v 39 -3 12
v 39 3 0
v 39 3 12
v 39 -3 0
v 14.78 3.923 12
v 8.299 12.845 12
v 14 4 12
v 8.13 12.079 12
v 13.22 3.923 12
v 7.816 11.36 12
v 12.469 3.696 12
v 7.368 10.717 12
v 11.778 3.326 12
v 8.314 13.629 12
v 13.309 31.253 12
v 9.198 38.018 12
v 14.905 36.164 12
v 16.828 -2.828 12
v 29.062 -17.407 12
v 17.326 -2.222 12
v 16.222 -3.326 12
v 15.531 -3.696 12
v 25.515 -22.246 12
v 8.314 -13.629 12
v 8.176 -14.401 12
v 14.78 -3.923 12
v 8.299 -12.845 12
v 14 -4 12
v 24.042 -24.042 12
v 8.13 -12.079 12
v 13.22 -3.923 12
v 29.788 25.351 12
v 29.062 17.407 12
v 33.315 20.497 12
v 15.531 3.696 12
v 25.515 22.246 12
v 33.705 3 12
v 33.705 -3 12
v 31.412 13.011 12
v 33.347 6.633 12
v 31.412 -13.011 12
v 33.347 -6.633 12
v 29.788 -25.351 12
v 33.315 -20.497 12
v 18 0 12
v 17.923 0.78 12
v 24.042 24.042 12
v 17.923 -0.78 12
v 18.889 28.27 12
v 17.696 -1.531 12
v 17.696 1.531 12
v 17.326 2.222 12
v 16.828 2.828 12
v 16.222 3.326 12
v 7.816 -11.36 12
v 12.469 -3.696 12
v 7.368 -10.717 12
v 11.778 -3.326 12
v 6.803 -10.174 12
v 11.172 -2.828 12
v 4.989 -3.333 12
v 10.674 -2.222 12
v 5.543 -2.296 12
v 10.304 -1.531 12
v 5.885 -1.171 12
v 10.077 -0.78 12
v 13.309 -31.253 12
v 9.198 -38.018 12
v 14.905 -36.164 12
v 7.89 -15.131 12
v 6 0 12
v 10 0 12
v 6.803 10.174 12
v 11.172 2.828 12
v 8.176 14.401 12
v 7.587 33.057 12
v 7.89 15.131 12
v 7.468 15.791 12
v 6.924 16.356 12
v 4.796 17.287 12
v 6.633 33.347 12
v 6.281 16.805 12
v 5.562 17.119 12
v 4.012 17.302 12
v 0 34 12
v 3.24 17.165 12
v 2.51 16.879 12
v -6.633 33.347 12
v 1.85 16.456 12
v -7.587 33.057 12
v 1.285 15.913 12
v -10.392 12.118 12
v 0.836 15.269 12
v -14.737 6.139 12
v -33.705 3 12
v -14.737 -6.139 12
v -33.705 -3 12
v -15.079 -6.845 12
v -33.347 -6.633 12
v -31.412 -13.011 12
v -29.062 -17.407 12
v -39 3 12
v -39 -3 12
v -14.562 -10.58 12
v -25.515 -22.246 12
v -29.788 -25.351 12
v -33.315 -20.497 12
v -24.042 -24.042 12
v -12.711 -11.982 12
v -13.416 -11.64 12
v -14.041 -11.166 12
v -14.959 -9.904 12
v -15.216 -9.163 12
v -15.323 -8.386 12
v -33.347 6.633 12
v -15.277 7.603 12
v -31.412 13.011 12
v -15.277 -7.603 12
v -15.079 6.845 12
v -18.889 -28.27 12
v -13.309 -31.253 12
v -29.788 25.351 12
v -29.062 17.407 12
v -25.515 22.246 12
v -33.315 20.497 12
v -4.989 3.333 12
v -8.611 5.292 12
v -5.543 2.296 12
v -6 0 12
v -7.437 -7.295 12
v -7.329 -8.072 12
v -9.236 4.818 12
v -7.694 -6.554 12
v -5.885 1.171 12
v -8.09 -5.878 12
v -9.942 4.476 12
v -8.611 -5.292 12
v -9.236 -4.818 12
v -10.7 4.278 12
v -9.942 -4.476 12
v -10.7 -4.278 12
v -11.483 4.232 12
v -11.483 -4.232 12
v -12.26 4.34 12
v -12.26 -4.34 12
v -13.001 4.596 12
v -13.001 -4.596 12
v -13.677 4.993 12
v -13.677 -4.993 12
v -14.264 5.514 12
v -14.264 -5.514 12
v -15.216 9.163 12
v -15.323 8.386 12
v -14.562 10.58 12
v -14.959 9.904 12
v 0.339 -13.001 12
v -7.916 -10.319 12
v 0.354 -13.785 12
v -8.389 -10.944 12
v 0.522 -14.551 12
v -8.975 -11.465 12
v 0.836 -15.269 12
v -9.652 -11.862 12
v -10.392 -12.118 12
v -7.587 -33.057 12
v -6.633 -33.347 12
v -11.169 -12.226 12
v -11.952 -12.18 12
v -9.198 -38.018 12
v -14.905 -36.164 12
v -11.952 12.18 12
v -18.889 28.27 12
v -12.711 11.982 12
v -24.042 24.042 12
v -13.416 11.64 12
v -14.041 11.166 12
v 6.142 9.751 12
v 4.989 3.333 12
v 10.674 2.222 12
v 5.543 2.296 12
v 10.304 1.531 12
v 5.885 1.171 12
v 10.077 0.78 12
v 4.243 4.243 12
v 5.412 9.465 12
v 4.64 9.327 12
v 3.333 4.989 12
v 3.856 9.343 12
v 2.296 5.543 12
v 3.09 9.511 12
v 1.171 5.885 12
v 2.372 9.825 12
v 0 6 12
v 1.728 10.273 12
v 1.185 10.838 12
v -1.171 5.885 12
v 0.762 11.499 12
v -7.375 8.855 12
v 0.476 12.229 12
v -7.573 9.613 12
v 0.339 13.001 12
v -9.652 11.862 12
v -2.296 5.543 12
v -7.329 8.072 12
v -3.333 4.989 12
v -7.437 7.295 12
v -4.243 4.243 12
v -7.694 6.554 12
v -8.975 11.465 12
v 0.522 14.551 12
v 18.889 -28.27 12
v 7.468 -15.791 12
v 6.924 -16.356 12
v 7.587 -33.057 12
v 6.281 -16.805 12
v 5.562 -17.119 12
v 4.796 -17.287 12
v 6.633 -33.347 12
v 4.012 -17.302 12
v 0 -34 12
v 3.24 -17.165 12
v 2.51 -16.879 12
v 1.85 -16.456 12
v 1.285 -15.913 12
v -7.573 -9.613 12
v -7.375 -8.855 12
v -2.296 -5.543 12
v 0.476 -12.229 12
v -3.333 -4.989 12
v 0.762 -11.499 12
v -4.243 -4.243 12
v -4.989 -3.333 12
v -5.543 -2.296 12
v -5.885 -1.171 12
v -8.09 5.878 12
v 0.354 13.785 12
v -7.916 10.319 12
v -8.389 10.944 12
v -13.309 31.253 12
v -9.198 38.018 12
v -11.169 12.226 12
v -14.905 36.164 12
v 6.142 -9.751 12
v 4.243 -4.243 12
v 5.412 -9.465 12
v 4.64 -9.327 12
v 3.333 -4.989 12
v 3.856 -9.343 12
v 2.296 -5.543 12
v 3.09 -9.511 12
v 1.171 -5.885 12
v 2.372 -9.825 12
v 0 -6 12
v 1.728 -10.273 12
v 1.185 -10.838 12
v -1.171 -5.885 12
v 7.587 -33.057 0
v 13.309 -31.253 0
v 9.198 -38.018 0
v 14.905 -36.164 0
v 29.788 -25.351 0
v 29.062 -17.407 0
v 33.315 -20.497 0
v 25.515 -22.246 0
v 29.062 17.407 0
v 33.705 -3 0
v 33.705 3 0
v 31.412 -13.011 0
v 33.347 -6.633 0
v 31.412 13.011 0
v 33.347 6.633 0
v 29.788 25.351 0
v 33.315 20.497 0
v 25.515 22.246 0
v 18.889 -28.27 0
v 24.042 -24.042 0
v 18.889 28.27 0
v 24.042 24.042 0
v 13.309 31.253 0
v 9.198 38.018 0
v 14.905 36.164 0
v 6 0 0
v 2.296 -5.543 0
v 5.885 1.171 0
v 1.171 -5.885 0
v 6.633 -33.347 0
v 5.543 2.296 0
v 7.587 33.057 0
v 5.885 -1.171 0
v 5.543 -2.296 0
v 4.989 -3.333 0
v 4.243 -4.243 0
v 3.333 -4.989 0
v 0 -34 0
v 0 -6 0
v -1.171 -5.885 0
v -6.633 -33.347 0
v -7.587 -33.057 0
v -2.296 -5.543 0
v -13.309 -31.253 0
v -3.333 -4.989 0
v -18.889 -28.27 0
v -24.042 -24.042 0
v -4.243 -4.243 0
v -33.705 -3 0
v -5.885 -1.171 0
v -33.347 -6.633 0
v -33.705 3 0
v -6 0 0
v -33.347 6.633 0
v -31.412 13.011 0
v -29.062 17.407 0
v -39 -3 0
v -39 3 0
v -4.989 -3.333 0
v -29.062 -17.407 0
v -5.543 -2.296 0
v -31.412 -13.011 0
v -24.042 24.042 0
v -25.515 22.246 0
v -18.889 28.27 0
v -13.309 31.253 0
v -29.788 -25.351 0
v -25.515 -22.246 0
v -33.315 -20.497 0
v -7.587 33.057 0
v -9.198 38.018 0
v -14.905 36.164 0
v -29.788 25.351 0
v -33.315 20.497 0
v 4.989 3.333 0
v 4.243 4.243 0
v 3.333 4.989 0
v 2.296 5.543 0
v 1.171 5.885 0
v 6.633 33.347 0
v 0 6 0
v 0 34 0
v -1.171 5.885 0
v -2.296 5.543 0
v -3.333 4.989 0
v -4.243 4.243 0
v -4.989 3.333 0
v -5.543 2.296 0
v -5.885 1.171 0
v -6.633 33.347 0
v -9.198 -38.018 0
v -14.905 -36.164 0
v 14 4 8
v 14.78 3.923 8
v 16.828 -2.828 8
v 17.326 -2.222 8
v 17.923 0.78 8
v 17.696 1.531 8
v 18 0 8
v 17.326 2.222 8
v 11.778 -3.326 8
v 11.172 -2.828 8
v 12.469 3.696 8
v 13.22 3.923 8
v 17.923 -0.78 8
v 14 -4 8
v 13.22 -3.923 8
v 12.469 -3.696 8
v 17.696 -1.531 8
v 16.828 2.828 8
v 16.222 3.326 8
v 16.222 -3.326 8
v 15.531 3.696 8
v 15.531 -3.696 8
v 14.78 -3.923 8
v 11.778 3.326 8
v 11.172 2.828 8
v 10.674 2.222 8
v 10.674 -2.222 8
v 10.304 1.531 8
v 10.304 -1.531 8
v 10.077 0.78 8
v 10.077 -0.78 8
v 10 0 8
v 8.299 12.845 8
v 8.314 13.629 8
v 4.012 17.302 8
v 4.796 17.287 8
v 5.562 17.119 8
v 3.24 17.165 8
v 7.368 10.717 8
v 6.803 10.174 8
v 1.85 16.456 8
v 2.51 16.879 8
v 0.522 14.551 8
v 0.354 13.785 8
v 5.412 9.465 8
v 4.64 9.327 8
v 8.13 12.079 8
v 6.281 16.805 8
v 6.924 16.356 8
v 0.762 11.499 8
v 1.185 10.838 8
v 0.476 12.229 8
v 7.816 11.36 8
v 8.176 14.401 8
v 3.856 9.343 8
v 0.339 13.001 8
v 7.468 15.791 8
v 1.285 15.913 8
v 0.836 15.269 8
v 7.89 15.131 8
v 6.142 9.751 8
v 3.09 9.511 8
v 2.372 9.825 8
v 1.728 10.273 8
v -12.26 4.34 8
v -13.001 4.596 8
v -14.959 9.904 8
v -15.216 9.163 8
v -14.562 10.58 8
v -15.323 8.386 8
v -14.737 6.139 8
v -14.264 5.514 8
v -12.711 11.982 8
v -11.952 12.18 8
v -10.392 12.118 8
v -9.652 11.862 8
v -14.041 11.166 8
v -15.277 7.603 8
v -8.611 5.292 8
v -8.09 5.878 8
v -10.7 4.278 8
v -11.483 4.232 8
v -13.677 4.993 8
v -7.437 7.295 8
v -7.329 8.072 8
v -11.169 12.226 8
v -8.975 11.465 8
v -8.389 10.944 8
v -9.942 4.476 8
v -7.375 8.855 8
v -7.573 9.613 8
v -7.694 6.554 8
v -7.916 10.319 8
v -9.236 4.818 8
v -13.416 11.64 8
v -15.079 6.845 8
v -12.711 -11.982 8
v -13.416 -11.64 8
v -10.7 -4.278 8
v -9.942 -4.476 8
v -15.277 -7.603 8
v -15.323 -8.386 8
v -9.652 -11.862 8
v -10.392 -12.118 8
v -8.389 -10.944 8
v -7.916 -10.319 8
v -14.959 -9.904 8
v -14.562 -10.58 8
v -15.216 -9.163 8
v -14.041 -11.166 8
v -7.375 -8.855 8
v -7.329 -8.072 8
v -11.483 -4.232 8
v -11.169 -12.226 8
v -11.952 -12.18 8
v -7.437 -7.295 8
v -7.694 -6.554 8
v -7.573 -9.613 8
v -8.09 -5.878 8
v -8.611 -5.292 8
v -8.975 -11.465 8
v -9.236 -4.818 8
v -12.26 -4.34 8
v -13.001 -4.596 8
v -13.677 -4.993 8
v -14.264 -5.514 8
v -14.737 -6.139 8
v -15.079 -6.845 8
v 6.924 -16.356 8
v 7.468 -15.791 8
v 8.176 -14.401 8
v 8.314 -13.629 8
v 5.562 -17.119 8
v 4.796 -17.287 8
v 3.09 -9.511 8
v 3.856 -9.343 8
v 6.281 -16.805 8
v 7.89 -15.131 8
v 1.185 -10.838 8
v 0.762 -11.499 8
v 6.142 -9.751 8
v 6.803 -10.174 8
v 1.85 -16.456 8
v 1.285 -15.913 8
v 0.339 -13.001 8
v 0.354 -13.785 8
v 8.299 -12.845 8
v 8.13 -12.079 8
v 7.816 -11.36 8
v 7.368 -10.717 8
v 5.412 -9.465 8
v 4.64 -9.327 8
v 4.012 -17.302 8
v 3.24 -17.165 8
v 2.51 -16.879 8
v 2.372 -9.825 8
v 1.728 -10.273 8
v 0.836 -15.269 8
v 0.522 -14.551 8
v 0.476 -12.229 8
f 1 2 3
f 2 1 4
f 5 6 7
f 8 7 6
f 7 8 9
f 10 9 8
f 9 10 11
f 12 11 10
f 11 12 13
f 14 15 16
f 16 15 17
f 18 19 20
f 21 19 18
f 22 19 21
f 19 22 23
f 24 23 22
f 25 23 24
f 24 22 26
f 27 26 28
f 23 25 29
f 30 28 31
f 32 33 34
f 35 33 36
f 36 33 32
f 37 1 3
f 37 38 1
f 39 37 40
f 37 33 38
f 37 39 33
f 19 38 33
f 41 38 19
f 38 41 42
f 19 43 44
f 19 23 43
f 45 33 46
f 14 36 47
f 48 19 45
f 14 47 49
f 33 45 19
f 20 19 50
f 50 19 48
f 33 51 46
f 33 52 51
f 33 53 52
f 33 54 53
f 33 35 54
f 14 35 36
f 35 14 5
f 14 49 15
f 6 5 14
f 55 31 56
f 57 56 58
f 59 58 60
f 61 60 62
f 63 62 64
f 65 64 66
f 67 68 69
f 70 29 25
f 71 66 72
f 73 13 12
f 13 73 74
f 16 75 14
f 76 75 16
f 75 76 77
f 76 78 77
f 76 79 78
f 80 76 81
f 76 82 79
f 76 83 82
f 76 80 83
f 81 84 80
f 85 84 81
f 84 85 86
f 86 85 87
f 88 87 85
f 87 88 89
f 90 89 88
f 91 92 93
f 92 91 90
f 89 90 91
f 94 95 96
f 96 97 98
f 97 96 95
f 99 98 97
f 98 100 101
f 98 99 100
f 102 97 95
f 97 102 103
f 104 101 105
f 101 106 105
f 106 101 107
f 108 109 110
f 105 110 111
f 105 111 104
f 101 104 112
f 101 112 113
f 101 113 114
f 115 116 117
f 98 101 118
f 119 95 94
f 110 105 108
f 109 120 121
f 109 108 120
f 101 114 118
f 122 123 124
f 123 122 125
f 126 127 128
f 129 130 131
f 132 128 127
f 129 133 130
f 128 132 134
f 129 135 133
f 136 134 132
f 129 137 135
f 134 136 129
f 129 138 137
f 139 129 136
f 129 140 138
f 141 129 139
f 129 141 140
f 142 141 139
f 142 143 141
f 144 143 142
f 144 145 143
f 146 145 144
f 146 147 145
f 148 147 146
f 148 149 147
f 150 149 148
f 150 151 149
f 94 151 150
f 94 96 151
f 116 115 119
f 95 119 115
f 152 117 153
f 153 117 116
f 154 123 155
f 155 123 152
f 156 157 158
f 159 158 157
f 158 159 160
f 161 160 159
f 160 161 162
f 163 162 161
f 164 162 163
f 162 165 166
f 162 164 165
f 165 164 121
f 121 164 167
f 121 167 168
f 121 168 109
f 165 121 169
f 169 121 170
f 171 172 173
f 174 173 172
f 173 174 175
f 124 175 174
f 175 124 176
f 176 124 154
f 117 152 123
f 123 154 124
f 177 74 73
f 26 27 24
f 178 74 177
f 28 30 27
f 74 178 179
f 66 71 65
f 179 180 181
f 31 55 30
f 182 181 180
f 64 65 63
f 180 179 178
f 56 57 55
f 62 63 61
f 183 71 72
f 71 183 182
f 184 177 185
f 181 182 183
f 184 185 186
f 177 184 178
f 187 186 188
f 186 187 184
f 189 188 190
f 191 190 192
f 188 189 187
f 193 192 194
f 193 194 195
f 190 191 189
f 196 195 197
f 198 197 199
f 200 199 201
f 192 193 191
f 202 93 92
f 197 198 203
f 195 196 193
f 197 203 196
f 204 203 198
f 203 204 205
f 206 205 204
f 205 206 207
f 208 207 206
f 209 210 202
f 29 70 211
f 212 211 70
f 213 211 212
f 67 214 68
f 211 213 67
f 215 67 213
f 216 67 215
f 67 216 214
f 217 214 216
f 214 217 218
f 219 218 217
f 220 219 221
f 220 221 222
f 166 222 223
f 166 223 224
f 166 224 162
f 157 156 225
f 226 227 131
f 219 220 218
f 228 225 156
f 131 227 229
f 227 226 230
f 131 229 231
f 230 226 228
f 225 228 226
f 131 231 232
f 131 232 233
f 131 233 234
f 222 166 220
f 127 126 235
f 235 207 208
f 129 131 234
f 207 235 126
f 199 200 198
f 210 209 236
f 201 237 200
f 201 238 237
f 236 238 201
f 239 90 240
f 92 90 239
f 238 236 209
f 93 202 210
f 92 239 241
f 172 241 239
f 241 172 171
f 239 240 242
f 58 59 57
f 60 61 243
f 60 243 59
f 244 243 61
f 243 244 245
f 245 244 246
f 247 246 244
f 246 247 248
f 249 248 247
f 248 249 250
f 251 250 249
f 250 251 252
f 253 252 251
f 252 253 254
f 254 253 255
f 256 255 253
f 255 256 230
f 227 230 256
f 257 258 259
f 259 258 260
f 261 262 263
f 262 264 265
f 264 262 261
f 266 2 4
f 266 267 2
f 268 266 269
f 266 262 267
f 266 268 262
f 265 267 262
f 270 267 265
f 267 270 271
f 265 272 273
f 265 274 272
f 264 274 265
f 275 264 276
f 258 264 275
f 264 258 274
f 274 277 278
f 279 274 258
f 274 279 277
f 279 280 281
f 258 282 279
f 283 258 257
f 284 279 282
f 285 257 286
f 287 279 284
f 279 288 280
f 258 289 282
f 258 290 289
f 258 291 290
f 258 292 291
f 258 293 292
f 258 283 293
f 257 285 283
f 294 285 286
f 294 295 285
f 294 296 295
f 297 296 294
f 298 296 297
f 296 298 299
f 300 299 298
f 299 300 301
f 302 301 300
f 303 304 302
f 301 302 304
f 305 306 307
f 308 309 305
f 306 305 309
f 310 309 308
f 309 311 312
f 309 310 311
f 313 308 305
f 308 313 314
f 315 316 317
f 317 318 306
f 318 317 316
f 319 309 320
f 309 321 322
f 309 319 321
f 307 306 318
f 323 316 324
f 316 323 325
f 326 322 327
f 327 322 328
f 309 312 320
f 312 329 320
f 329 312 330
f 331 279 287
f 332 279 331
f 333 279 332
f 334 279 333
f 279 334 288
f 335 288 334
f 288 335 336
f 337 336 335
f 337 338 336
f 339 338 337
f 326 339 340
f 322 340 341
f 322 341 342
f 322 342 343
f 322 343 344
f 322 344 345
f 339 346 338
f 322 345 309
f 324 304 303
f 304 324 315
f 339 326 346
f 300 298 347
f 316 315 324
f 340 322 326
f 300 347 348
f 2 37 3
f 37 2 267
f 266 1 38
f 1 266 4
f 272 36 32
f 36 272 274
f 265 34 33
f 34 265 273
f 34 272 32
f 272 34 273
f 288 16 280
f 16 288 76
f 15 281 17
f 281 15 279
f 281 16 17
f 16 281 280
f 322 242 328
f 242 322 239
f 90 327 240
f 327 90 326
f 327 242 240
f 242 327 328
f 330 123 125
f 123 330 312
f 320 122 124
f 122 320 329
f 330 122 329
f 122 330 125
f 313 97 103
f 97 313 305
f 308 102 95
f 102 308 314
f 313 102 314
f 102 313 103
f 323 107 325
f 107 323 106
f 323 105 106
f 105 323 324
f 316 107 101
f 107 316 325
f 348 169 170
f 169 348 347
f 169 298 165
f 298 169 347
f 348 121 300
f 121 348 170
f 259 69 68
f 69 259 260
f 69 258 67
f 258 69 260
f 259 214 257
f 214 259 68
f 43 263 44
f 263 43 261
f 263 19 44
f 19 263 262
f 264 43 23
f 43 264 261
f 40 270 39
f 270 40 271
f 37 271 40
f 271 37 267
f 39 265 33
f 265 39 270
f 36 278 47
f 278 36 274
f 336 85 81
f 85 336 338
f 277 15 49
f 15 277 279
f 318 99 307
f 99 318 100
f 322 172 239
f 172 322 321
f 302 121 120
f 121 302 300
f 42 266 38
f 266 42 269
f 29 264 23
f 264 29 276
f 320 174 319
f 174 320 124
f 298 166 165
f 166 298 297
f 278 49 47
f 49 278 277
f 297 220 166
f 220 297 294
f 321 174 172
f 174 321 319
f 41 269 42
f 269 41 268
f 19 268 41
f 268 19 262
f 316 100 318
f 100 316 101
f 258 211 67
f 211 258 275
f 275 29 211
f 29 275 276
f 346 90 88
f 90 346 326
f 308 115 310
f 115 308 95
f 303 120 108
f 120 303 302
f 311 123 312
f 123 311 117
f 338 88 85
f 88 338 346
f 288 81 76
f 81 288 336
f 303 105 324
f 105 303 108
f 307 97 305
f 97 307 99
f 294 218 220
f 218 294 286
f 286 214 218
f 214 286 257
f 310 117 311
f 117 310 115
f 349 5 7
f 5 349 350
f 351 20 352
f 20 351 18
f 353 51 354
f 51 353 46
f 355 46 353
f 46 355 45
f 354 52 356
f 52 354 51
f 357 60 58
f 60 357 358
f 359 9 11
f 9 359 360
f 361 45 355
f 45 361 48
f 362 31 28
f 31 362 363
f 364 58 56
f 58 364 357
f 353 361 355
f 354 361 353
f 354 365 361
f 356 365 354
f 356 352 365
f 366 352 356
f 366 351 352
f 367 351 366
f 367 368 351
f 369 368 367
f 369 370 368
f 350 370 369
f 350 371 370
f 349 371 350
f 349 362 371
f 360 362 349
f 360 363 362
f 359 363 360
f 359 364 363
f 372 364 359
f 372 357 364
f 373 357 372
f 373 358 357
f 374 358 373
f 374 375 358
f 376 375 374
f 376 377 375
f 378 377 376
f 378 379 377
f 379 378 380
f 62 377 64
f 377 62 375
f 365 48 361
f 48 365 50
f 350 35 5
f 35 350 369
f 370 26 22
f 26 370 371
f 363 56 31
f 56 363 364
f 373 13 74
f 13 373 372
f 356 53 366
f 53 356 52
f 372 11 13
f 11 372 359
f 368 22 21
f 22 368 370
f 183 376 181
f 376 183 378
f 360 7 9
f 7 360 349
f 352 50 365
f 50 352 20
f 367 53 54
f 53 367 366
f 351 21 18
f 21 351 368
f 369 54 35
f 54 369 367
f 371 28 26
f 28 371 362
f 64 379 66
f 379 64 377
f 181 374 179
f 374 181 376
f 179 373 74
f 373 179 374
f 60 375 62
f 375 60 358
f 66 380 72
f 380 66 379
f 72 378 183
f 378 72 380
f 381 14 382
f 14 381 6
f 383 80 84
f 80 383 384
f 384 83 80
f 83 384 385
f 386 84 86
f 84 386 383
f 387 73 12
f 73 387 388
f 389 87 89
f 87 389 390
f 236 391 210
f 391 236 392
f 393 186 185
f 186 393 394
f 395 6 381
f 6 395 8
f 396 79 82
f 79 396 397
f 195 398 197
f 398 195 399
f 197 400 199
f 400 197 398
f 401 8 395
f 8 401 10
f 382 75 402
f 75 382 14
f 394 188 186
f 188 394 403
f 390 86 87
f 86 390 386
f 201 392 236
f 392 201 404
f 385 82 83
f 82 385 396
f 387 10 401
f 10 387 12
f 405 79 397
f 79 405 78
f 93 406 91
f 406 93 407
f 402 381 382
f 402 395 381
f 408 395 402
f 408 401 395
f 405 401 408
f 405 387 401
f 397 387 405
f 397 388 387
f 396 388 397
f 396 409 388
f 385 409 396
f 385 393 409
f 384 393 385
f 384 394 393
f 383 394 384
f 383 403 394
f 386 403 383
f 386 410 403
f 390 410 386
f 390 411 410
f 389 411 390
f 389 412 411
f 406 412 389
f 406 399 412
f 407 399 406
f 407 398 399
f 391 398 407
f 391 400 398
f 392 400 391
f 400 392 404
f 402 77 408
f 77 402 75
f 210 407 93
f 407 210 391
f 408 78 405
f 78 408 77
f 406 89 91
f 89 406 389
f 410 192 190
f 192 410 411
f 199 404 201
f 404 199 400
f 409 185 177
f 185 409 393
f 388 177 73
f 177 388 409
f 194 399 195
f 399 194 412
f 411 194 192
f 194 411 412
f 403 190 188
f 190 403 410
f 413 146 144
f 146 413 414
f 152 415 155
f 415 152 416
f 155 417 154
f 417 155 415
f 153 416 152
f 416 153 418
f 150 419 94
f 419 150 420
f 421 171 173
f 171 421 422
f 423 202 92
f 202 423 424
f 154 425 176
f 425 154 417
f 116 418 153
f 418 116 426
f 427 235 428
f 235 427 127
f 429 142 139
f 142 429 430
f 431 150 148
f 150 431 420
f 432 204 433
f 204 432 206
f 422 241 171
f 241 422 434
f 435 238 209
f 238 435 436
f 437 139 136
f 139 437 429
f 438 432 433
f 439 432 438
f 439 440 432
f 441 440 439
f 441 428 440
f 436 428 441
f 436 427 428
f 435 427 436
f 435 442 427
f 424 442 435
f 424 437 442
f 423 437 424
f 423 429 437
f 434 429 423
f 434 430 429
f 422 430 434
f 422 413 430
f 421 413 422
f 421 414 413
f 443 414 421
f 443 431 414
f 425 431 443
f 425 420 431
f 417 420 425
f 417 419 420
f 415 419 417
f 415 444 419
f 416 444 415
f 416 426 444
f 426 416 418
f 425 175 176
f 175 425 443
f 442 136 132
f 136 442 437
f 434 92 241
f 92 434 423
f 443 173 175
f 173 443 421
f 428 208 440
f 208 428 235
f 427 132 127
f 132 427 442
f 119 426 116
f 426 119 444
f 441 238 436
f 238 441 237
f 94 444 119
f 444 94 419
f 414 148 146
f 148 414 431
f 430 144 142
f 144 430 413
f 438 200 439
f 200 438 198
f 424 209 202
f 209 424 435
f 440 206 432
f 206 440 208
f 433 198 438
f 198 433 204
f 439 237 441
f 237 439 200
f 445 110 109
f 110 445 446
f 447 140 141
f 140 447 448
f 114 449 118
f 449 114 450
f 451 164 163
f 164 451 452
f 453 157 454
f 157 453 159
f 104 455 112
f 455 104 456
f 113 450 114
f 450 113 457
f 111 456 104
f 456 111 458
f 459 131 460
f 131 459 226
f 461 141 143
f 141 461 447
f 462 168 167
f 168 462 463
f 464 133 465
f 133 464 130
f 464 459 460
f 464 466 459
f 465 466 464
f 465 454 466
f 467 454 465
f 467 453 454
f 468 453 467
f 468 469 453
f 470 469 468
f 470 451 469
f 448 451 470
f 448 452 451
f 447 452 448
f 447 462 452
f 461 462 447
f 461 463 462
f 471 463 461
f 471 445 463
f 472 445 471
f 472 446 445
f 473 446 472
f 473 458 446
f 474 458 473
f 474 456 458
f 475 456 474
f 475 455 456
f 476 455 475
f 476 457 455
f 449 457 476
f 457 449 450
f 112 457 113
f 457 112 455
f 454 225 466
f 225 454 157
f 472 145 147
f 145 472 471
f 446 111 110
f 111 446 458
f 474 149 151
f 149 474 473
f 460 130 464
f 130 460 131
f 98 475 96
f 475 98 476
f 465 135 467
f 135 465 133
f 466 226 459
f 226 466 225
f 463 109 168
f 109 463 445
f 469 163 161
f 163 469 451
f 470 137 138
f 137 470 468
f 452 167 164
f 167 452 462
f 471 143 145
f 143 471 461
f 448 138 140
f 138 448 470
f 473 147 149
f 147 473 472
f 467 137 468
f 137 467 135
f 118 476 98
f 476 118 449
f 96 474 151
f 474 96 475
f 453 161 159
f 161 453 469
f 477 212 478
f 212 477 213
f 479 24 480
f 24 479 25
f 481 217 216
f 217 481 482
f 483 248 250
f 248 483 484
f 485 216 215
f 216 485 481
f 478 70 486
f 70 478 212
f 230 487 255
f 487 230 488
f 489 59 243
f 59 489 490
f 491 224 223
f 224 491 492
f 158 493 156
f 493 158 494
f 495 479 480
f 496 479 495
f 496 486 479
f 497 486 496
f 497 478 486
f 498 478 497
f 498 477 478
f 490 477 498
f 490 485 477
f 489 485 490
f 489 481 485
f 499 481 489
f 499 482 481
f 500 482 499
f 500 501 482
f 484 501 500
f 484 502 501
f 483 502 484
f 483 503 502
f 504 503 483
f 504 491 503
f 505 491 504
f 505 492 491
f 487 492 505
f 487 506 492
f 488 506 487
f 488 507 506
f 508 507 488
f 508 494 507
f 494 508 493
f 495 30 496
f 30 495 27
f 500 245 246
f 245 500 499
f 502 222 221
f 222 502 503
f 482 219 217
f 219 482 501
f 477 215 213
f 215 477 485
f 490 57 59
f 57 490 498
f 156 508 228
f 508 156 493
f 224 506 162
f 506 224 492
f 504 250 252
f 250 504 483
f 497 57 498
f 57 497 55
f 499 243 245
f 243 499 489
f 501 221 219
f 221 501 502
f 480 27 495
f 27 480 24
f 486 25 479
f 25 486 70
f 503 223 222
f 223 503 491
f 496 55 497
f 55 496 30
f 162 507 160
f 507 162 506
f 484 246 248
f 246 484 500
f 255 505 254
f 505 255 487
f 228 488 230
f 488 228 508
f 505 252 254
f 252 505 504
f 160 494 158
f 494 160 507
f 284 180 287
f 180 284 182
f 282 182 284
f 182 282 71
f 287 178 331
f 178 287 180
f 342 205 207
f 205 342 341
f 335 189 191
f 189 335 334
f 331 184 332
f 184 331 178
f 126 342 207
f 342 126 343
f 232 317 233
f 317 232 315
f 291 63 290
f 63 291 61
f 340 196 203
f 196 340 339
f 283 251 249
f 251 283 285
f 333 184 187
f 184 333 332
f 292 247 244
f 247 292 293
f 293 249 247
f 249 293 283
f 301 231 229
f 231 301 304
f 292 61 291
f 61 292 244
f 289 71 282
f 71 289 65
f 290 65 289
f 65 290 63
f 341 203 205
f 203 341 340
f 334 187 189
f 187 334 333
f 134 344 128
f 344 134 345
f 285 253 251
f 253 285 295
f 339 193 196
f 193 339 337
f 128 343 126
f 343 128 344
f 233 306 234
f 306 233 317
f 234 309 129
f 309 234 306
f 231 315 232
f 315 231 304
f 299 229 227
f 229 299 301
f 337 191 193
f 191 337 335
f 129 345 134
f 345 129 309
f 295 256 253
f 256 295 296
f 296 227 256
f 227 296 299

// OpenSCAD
$fn = 32;

// ----------------------------------------------------------------------
// Spur blank: lightened gear blank
// ----------------------------------------------------------------------

// --- parameters (mm) ---
disc_r = 34;              // blank root radius
disc_t = 12;              // blank thickness
n_teeth = 10;             // stub tooth count
tooth_w = 6;              // tooth width at the root
tooth_h = 5;              // tooth height above the root
bore_r = 6;               // central bore radius
ring_r = 14;              // lightening pocket ring radius
pocket_r = 4;             // lightening pocket radius

out_r = disc_r + tooth_h;  // tip radius
bbox_x = 78.0;  // measured width over the teeth
bbox_y = 76.04;  // measured depth over the teeth

difference() {
union() {
  cylinder(r = disc_r, h = disc_t);
  for (i = [0 : n_teeth - 1])
    rotate([0, 0, i * 360 / n_teeth])
      translate([disc_r - 1, -tooth_w / 2, 0])
        cube([tooth_h + 1, tooth_w, disc_t]);
}
  translate([0, 0, -1]) cylinder(r = bore_r, h = disc_t + 2);
  for (i = [0 : 5])
    rotate([0, 0, i * 72])
      translate([ring_r, 0, disc_t - 4])
        cylinder(r = pocket_r, h = 5);
}
